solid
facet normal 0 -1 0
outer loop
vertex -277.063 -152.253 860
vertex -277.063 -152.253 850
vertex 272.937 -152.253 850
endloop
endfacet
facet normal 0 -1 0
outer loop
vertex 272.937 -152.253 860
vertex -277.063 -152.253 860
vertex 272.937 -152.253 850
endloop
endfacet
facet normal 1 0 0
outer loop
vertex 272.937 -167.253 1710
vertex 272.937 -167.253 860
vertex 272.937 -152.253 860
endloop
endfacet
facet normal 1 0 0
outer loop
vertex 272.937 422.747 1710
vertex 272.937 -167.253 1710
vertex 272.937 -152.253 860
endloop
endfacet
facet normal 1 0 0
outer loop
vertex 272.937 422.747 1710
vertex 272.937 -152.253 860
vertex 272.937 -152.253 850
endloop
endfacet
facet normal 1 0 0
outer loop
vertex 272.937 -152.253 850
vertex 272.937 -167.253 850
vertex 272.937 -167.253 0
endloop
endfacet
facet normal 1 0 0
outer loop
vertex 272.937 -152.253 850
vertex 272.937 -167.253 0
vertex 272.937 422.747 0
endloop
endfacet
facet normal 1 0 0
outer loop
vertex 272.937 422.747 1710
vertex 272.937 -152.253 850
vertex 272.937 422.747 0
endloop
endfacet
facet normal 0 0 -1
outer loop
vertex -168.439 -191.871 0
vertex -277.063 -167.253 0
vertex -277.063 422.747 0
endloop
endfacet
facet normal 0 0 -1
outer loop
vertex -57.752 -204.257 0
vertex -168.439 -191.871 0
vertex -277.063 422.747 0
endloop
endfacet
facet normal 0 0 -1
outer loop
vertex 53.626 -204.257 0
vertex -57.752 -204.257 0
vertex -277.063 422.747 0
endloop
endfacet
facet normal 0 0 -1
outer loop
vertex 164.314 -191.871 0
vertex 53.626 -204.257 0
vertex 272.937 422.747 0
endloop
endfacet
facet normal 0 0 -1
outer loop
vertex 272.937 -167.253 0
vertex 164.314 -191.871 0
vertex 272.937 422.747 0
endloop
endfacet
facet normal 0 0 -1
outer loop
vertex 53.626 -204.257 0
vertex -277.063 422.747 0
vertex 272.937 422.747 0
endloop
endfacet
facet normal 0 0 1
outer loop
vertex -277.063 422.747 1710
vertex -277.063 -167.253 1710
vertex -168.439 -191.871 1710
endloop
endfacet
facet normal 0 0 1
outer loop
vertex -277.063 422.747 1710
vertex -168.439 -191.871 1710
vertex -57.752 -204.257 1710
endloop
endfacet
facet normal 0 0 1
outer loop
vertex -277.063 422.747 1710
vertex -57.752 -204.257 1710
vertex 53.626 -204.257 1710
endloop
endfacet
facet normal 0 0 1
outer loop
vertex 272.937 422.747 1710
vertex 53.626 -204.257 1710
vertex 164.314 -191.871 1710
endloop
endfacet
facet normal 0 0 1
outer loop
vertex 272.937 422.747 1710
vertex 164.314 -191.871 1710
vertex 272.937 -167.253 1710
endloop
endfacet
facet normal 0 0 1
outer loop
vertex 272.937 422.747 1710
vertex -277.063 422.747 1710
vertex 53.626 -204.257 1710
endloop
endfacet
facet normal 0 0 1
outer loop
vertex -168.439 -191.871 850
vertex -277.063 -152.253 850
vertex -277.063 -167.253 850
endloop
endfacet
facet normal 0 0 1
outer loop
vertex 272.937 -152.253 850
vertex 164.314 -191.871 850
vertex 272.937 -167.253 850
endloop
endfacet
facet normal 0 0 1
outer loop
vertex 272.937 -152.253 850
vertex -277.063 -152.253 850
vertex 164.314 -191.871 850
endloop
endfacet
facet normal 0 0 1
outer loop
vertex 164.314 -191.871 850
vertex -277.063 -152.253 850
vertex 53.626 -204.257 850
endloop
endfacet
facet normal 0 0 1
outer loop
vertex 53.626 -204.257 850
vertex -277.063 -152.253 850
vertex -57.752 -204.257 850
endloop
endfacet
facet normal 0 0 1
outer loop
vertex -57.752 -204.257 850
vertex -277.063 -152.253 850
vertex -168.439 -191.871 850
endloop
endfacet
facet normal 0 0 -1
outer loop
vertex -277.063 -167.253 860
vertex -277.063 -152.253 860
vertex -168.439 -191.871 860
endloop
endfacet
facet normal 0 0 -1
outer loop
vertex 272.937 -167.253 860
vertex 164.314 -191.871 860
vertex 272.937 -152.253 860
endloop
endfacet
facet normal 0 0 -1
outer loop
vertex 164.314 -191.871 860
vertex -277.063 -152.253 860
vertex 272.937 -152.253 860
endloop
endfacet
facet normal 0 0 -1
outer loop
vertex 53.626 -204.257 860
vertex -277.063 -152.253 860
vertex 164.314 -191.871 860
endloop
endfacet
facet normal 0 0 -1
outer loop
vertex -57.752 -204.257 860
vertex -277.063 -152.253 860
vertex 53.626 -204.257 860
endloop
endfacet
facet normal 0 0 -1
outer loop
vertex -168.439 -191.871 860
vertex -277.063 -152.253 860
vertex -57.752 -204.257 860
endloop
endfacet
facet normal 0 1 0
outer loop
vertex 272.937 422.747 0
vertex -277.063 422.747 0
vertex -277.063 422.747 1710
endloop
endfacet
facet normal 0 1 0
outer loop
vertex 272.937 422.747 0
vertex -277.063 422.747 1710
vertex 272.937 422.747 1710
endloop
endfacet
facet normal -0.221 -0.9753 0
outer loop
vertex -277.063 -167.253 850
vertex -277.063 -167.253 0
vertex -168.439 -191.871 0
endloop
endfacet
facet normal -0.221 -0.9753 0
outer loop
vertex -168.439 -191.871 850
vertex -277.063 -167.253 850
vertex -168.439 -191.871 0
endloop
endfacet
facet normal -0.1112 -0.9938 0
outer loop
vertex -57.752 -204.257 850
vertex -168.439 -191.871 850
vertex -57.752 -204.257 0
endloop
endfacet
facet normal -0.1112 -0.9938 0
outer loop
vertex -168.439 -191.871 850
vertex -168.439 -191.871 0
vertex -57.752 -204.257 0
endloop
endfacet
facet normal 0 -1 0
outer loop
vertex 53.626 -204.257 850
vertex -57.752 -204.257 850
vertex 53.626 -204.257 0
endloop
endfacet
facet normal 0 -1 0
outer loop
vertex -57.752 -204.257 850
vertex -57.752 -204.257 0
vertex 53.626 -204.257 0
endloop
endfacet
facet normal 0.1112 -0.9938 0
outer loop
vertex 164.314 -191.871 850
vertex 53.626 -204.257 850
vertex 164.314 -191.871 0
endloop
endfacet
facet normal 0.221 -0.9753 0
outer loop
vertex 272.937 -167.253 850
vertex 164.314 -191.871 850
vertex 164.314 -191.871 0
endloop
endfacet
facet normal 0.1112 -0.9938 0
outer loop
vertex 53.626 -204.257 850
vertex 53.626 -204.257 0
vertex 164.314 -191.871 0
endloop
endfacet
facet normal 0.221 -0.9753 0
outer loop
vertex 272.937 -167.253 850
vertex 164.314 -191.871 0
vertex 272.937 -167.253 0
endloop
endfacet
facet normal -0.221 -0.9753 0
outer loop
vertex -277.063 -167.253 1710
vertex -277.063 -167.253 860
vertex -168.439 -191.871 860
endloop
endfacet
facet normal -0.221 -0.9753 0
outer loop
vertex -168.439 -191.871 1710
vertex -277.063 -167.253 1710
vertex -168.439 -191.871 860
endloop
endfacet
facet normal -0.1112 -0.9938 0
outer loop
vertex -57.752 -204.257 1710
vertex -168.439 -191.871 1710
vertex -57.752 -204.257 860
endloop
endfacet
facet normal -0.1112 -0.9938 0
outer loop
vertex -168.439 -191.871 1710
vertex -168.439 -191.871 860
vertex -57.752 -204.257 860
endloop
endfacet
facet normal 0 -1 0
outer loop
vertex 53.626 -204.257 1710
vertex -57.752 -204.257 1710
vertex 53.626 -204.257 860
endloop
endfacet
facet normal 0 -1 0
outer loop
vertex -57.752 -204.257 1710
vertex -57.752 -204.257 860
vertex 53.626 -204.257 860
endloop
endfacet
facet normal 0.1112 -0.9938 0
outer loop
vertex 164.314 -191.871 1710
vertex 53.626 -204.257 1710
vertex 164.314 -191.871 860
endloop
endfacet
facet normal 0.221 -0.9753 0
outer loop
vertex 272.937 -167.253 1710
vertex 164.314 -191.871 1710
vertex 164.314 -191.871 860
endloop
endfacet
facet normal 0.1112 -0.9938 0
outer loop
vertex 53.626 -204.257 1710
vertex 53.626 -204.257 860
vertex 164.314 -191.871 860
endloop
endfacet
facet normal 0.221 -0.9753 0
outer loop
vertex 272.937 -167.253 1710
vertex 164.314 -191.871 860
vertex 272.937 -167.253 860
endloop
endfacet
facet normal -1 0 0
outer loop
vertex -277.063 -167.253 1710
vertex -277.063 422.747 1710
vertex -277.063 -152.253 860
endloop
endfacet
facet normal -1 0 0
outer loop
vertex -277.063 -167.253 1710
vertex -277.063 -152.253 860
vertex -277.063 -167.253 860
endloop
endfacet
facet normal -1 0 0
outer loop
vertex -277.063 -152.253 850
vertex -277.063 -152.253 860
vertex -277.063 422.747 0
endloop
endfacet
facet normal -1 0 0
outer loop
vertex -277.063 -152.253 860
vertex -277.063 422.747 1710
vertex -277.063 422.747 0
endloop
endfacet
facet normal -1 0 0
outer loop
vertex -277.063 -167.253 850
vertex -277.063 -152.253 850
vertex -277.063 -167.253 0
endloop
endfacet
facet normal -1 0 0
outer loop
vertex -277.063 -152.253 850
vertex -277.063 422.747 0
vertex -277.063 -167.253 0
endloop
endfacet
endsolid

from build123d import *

# Parameters (mm, degrees)
F1_DEPTH = 850
F2_W     = 550
F2_H     = 575
F3_DEPTH = 10
F4_W     = 550
F4_H     = 575
F5_DEPTH = 850


with BuildPart() as f1:
    # F0 (on Top) → F1 (new body)
    with BuildSketch(Plane.XY):
        with BuildLine():
            Line((-277.06279, 422.74684), (-277.06279, -167.25316))
            ThreePointArc((-277.06279, -167.25316), (-2.06279, -205.808933), (272.93721, -167.25316))
            Line((272.93721, -167.25316), (272.93721, 422.74684))
            Line((272.93721, 422.74684), (-277.06279, 422.74684))
        make_face()
    extrude(amount=F1_DEPTH)

    # F2 (on face) → F3 (join)
    with BuildSketch(Plane.XY.offset(850)):
        with Locations((-2.06279, 135.24684)):
            Rectangle(F2_W, F2_H)
    extrude(amount=F3_DEPTH)

    # F4 (on face) → F5 (join)
    with BuildSketch(Plane.XY.offset(860)):
        with Locations((-2.06279, 135.24684)):
            Rectangle(F4_W, F4_H)
        with BuildLine():
            Line((272.93721, -152.25316), (-277.06279, -152.25316))
            Line((-277.06279, -152.25316), (-277.06279, -167.25316))
            ThreePointArc((-277.06279, -167.25316), (-2.06279, -205.808933), (272.93721, -167.25316))
            Line((272.93721, -167.25316), (272.93721, -152.25316))
        make_face()
    extrude(amount=F5_DEPTH)


solid = f1.part
